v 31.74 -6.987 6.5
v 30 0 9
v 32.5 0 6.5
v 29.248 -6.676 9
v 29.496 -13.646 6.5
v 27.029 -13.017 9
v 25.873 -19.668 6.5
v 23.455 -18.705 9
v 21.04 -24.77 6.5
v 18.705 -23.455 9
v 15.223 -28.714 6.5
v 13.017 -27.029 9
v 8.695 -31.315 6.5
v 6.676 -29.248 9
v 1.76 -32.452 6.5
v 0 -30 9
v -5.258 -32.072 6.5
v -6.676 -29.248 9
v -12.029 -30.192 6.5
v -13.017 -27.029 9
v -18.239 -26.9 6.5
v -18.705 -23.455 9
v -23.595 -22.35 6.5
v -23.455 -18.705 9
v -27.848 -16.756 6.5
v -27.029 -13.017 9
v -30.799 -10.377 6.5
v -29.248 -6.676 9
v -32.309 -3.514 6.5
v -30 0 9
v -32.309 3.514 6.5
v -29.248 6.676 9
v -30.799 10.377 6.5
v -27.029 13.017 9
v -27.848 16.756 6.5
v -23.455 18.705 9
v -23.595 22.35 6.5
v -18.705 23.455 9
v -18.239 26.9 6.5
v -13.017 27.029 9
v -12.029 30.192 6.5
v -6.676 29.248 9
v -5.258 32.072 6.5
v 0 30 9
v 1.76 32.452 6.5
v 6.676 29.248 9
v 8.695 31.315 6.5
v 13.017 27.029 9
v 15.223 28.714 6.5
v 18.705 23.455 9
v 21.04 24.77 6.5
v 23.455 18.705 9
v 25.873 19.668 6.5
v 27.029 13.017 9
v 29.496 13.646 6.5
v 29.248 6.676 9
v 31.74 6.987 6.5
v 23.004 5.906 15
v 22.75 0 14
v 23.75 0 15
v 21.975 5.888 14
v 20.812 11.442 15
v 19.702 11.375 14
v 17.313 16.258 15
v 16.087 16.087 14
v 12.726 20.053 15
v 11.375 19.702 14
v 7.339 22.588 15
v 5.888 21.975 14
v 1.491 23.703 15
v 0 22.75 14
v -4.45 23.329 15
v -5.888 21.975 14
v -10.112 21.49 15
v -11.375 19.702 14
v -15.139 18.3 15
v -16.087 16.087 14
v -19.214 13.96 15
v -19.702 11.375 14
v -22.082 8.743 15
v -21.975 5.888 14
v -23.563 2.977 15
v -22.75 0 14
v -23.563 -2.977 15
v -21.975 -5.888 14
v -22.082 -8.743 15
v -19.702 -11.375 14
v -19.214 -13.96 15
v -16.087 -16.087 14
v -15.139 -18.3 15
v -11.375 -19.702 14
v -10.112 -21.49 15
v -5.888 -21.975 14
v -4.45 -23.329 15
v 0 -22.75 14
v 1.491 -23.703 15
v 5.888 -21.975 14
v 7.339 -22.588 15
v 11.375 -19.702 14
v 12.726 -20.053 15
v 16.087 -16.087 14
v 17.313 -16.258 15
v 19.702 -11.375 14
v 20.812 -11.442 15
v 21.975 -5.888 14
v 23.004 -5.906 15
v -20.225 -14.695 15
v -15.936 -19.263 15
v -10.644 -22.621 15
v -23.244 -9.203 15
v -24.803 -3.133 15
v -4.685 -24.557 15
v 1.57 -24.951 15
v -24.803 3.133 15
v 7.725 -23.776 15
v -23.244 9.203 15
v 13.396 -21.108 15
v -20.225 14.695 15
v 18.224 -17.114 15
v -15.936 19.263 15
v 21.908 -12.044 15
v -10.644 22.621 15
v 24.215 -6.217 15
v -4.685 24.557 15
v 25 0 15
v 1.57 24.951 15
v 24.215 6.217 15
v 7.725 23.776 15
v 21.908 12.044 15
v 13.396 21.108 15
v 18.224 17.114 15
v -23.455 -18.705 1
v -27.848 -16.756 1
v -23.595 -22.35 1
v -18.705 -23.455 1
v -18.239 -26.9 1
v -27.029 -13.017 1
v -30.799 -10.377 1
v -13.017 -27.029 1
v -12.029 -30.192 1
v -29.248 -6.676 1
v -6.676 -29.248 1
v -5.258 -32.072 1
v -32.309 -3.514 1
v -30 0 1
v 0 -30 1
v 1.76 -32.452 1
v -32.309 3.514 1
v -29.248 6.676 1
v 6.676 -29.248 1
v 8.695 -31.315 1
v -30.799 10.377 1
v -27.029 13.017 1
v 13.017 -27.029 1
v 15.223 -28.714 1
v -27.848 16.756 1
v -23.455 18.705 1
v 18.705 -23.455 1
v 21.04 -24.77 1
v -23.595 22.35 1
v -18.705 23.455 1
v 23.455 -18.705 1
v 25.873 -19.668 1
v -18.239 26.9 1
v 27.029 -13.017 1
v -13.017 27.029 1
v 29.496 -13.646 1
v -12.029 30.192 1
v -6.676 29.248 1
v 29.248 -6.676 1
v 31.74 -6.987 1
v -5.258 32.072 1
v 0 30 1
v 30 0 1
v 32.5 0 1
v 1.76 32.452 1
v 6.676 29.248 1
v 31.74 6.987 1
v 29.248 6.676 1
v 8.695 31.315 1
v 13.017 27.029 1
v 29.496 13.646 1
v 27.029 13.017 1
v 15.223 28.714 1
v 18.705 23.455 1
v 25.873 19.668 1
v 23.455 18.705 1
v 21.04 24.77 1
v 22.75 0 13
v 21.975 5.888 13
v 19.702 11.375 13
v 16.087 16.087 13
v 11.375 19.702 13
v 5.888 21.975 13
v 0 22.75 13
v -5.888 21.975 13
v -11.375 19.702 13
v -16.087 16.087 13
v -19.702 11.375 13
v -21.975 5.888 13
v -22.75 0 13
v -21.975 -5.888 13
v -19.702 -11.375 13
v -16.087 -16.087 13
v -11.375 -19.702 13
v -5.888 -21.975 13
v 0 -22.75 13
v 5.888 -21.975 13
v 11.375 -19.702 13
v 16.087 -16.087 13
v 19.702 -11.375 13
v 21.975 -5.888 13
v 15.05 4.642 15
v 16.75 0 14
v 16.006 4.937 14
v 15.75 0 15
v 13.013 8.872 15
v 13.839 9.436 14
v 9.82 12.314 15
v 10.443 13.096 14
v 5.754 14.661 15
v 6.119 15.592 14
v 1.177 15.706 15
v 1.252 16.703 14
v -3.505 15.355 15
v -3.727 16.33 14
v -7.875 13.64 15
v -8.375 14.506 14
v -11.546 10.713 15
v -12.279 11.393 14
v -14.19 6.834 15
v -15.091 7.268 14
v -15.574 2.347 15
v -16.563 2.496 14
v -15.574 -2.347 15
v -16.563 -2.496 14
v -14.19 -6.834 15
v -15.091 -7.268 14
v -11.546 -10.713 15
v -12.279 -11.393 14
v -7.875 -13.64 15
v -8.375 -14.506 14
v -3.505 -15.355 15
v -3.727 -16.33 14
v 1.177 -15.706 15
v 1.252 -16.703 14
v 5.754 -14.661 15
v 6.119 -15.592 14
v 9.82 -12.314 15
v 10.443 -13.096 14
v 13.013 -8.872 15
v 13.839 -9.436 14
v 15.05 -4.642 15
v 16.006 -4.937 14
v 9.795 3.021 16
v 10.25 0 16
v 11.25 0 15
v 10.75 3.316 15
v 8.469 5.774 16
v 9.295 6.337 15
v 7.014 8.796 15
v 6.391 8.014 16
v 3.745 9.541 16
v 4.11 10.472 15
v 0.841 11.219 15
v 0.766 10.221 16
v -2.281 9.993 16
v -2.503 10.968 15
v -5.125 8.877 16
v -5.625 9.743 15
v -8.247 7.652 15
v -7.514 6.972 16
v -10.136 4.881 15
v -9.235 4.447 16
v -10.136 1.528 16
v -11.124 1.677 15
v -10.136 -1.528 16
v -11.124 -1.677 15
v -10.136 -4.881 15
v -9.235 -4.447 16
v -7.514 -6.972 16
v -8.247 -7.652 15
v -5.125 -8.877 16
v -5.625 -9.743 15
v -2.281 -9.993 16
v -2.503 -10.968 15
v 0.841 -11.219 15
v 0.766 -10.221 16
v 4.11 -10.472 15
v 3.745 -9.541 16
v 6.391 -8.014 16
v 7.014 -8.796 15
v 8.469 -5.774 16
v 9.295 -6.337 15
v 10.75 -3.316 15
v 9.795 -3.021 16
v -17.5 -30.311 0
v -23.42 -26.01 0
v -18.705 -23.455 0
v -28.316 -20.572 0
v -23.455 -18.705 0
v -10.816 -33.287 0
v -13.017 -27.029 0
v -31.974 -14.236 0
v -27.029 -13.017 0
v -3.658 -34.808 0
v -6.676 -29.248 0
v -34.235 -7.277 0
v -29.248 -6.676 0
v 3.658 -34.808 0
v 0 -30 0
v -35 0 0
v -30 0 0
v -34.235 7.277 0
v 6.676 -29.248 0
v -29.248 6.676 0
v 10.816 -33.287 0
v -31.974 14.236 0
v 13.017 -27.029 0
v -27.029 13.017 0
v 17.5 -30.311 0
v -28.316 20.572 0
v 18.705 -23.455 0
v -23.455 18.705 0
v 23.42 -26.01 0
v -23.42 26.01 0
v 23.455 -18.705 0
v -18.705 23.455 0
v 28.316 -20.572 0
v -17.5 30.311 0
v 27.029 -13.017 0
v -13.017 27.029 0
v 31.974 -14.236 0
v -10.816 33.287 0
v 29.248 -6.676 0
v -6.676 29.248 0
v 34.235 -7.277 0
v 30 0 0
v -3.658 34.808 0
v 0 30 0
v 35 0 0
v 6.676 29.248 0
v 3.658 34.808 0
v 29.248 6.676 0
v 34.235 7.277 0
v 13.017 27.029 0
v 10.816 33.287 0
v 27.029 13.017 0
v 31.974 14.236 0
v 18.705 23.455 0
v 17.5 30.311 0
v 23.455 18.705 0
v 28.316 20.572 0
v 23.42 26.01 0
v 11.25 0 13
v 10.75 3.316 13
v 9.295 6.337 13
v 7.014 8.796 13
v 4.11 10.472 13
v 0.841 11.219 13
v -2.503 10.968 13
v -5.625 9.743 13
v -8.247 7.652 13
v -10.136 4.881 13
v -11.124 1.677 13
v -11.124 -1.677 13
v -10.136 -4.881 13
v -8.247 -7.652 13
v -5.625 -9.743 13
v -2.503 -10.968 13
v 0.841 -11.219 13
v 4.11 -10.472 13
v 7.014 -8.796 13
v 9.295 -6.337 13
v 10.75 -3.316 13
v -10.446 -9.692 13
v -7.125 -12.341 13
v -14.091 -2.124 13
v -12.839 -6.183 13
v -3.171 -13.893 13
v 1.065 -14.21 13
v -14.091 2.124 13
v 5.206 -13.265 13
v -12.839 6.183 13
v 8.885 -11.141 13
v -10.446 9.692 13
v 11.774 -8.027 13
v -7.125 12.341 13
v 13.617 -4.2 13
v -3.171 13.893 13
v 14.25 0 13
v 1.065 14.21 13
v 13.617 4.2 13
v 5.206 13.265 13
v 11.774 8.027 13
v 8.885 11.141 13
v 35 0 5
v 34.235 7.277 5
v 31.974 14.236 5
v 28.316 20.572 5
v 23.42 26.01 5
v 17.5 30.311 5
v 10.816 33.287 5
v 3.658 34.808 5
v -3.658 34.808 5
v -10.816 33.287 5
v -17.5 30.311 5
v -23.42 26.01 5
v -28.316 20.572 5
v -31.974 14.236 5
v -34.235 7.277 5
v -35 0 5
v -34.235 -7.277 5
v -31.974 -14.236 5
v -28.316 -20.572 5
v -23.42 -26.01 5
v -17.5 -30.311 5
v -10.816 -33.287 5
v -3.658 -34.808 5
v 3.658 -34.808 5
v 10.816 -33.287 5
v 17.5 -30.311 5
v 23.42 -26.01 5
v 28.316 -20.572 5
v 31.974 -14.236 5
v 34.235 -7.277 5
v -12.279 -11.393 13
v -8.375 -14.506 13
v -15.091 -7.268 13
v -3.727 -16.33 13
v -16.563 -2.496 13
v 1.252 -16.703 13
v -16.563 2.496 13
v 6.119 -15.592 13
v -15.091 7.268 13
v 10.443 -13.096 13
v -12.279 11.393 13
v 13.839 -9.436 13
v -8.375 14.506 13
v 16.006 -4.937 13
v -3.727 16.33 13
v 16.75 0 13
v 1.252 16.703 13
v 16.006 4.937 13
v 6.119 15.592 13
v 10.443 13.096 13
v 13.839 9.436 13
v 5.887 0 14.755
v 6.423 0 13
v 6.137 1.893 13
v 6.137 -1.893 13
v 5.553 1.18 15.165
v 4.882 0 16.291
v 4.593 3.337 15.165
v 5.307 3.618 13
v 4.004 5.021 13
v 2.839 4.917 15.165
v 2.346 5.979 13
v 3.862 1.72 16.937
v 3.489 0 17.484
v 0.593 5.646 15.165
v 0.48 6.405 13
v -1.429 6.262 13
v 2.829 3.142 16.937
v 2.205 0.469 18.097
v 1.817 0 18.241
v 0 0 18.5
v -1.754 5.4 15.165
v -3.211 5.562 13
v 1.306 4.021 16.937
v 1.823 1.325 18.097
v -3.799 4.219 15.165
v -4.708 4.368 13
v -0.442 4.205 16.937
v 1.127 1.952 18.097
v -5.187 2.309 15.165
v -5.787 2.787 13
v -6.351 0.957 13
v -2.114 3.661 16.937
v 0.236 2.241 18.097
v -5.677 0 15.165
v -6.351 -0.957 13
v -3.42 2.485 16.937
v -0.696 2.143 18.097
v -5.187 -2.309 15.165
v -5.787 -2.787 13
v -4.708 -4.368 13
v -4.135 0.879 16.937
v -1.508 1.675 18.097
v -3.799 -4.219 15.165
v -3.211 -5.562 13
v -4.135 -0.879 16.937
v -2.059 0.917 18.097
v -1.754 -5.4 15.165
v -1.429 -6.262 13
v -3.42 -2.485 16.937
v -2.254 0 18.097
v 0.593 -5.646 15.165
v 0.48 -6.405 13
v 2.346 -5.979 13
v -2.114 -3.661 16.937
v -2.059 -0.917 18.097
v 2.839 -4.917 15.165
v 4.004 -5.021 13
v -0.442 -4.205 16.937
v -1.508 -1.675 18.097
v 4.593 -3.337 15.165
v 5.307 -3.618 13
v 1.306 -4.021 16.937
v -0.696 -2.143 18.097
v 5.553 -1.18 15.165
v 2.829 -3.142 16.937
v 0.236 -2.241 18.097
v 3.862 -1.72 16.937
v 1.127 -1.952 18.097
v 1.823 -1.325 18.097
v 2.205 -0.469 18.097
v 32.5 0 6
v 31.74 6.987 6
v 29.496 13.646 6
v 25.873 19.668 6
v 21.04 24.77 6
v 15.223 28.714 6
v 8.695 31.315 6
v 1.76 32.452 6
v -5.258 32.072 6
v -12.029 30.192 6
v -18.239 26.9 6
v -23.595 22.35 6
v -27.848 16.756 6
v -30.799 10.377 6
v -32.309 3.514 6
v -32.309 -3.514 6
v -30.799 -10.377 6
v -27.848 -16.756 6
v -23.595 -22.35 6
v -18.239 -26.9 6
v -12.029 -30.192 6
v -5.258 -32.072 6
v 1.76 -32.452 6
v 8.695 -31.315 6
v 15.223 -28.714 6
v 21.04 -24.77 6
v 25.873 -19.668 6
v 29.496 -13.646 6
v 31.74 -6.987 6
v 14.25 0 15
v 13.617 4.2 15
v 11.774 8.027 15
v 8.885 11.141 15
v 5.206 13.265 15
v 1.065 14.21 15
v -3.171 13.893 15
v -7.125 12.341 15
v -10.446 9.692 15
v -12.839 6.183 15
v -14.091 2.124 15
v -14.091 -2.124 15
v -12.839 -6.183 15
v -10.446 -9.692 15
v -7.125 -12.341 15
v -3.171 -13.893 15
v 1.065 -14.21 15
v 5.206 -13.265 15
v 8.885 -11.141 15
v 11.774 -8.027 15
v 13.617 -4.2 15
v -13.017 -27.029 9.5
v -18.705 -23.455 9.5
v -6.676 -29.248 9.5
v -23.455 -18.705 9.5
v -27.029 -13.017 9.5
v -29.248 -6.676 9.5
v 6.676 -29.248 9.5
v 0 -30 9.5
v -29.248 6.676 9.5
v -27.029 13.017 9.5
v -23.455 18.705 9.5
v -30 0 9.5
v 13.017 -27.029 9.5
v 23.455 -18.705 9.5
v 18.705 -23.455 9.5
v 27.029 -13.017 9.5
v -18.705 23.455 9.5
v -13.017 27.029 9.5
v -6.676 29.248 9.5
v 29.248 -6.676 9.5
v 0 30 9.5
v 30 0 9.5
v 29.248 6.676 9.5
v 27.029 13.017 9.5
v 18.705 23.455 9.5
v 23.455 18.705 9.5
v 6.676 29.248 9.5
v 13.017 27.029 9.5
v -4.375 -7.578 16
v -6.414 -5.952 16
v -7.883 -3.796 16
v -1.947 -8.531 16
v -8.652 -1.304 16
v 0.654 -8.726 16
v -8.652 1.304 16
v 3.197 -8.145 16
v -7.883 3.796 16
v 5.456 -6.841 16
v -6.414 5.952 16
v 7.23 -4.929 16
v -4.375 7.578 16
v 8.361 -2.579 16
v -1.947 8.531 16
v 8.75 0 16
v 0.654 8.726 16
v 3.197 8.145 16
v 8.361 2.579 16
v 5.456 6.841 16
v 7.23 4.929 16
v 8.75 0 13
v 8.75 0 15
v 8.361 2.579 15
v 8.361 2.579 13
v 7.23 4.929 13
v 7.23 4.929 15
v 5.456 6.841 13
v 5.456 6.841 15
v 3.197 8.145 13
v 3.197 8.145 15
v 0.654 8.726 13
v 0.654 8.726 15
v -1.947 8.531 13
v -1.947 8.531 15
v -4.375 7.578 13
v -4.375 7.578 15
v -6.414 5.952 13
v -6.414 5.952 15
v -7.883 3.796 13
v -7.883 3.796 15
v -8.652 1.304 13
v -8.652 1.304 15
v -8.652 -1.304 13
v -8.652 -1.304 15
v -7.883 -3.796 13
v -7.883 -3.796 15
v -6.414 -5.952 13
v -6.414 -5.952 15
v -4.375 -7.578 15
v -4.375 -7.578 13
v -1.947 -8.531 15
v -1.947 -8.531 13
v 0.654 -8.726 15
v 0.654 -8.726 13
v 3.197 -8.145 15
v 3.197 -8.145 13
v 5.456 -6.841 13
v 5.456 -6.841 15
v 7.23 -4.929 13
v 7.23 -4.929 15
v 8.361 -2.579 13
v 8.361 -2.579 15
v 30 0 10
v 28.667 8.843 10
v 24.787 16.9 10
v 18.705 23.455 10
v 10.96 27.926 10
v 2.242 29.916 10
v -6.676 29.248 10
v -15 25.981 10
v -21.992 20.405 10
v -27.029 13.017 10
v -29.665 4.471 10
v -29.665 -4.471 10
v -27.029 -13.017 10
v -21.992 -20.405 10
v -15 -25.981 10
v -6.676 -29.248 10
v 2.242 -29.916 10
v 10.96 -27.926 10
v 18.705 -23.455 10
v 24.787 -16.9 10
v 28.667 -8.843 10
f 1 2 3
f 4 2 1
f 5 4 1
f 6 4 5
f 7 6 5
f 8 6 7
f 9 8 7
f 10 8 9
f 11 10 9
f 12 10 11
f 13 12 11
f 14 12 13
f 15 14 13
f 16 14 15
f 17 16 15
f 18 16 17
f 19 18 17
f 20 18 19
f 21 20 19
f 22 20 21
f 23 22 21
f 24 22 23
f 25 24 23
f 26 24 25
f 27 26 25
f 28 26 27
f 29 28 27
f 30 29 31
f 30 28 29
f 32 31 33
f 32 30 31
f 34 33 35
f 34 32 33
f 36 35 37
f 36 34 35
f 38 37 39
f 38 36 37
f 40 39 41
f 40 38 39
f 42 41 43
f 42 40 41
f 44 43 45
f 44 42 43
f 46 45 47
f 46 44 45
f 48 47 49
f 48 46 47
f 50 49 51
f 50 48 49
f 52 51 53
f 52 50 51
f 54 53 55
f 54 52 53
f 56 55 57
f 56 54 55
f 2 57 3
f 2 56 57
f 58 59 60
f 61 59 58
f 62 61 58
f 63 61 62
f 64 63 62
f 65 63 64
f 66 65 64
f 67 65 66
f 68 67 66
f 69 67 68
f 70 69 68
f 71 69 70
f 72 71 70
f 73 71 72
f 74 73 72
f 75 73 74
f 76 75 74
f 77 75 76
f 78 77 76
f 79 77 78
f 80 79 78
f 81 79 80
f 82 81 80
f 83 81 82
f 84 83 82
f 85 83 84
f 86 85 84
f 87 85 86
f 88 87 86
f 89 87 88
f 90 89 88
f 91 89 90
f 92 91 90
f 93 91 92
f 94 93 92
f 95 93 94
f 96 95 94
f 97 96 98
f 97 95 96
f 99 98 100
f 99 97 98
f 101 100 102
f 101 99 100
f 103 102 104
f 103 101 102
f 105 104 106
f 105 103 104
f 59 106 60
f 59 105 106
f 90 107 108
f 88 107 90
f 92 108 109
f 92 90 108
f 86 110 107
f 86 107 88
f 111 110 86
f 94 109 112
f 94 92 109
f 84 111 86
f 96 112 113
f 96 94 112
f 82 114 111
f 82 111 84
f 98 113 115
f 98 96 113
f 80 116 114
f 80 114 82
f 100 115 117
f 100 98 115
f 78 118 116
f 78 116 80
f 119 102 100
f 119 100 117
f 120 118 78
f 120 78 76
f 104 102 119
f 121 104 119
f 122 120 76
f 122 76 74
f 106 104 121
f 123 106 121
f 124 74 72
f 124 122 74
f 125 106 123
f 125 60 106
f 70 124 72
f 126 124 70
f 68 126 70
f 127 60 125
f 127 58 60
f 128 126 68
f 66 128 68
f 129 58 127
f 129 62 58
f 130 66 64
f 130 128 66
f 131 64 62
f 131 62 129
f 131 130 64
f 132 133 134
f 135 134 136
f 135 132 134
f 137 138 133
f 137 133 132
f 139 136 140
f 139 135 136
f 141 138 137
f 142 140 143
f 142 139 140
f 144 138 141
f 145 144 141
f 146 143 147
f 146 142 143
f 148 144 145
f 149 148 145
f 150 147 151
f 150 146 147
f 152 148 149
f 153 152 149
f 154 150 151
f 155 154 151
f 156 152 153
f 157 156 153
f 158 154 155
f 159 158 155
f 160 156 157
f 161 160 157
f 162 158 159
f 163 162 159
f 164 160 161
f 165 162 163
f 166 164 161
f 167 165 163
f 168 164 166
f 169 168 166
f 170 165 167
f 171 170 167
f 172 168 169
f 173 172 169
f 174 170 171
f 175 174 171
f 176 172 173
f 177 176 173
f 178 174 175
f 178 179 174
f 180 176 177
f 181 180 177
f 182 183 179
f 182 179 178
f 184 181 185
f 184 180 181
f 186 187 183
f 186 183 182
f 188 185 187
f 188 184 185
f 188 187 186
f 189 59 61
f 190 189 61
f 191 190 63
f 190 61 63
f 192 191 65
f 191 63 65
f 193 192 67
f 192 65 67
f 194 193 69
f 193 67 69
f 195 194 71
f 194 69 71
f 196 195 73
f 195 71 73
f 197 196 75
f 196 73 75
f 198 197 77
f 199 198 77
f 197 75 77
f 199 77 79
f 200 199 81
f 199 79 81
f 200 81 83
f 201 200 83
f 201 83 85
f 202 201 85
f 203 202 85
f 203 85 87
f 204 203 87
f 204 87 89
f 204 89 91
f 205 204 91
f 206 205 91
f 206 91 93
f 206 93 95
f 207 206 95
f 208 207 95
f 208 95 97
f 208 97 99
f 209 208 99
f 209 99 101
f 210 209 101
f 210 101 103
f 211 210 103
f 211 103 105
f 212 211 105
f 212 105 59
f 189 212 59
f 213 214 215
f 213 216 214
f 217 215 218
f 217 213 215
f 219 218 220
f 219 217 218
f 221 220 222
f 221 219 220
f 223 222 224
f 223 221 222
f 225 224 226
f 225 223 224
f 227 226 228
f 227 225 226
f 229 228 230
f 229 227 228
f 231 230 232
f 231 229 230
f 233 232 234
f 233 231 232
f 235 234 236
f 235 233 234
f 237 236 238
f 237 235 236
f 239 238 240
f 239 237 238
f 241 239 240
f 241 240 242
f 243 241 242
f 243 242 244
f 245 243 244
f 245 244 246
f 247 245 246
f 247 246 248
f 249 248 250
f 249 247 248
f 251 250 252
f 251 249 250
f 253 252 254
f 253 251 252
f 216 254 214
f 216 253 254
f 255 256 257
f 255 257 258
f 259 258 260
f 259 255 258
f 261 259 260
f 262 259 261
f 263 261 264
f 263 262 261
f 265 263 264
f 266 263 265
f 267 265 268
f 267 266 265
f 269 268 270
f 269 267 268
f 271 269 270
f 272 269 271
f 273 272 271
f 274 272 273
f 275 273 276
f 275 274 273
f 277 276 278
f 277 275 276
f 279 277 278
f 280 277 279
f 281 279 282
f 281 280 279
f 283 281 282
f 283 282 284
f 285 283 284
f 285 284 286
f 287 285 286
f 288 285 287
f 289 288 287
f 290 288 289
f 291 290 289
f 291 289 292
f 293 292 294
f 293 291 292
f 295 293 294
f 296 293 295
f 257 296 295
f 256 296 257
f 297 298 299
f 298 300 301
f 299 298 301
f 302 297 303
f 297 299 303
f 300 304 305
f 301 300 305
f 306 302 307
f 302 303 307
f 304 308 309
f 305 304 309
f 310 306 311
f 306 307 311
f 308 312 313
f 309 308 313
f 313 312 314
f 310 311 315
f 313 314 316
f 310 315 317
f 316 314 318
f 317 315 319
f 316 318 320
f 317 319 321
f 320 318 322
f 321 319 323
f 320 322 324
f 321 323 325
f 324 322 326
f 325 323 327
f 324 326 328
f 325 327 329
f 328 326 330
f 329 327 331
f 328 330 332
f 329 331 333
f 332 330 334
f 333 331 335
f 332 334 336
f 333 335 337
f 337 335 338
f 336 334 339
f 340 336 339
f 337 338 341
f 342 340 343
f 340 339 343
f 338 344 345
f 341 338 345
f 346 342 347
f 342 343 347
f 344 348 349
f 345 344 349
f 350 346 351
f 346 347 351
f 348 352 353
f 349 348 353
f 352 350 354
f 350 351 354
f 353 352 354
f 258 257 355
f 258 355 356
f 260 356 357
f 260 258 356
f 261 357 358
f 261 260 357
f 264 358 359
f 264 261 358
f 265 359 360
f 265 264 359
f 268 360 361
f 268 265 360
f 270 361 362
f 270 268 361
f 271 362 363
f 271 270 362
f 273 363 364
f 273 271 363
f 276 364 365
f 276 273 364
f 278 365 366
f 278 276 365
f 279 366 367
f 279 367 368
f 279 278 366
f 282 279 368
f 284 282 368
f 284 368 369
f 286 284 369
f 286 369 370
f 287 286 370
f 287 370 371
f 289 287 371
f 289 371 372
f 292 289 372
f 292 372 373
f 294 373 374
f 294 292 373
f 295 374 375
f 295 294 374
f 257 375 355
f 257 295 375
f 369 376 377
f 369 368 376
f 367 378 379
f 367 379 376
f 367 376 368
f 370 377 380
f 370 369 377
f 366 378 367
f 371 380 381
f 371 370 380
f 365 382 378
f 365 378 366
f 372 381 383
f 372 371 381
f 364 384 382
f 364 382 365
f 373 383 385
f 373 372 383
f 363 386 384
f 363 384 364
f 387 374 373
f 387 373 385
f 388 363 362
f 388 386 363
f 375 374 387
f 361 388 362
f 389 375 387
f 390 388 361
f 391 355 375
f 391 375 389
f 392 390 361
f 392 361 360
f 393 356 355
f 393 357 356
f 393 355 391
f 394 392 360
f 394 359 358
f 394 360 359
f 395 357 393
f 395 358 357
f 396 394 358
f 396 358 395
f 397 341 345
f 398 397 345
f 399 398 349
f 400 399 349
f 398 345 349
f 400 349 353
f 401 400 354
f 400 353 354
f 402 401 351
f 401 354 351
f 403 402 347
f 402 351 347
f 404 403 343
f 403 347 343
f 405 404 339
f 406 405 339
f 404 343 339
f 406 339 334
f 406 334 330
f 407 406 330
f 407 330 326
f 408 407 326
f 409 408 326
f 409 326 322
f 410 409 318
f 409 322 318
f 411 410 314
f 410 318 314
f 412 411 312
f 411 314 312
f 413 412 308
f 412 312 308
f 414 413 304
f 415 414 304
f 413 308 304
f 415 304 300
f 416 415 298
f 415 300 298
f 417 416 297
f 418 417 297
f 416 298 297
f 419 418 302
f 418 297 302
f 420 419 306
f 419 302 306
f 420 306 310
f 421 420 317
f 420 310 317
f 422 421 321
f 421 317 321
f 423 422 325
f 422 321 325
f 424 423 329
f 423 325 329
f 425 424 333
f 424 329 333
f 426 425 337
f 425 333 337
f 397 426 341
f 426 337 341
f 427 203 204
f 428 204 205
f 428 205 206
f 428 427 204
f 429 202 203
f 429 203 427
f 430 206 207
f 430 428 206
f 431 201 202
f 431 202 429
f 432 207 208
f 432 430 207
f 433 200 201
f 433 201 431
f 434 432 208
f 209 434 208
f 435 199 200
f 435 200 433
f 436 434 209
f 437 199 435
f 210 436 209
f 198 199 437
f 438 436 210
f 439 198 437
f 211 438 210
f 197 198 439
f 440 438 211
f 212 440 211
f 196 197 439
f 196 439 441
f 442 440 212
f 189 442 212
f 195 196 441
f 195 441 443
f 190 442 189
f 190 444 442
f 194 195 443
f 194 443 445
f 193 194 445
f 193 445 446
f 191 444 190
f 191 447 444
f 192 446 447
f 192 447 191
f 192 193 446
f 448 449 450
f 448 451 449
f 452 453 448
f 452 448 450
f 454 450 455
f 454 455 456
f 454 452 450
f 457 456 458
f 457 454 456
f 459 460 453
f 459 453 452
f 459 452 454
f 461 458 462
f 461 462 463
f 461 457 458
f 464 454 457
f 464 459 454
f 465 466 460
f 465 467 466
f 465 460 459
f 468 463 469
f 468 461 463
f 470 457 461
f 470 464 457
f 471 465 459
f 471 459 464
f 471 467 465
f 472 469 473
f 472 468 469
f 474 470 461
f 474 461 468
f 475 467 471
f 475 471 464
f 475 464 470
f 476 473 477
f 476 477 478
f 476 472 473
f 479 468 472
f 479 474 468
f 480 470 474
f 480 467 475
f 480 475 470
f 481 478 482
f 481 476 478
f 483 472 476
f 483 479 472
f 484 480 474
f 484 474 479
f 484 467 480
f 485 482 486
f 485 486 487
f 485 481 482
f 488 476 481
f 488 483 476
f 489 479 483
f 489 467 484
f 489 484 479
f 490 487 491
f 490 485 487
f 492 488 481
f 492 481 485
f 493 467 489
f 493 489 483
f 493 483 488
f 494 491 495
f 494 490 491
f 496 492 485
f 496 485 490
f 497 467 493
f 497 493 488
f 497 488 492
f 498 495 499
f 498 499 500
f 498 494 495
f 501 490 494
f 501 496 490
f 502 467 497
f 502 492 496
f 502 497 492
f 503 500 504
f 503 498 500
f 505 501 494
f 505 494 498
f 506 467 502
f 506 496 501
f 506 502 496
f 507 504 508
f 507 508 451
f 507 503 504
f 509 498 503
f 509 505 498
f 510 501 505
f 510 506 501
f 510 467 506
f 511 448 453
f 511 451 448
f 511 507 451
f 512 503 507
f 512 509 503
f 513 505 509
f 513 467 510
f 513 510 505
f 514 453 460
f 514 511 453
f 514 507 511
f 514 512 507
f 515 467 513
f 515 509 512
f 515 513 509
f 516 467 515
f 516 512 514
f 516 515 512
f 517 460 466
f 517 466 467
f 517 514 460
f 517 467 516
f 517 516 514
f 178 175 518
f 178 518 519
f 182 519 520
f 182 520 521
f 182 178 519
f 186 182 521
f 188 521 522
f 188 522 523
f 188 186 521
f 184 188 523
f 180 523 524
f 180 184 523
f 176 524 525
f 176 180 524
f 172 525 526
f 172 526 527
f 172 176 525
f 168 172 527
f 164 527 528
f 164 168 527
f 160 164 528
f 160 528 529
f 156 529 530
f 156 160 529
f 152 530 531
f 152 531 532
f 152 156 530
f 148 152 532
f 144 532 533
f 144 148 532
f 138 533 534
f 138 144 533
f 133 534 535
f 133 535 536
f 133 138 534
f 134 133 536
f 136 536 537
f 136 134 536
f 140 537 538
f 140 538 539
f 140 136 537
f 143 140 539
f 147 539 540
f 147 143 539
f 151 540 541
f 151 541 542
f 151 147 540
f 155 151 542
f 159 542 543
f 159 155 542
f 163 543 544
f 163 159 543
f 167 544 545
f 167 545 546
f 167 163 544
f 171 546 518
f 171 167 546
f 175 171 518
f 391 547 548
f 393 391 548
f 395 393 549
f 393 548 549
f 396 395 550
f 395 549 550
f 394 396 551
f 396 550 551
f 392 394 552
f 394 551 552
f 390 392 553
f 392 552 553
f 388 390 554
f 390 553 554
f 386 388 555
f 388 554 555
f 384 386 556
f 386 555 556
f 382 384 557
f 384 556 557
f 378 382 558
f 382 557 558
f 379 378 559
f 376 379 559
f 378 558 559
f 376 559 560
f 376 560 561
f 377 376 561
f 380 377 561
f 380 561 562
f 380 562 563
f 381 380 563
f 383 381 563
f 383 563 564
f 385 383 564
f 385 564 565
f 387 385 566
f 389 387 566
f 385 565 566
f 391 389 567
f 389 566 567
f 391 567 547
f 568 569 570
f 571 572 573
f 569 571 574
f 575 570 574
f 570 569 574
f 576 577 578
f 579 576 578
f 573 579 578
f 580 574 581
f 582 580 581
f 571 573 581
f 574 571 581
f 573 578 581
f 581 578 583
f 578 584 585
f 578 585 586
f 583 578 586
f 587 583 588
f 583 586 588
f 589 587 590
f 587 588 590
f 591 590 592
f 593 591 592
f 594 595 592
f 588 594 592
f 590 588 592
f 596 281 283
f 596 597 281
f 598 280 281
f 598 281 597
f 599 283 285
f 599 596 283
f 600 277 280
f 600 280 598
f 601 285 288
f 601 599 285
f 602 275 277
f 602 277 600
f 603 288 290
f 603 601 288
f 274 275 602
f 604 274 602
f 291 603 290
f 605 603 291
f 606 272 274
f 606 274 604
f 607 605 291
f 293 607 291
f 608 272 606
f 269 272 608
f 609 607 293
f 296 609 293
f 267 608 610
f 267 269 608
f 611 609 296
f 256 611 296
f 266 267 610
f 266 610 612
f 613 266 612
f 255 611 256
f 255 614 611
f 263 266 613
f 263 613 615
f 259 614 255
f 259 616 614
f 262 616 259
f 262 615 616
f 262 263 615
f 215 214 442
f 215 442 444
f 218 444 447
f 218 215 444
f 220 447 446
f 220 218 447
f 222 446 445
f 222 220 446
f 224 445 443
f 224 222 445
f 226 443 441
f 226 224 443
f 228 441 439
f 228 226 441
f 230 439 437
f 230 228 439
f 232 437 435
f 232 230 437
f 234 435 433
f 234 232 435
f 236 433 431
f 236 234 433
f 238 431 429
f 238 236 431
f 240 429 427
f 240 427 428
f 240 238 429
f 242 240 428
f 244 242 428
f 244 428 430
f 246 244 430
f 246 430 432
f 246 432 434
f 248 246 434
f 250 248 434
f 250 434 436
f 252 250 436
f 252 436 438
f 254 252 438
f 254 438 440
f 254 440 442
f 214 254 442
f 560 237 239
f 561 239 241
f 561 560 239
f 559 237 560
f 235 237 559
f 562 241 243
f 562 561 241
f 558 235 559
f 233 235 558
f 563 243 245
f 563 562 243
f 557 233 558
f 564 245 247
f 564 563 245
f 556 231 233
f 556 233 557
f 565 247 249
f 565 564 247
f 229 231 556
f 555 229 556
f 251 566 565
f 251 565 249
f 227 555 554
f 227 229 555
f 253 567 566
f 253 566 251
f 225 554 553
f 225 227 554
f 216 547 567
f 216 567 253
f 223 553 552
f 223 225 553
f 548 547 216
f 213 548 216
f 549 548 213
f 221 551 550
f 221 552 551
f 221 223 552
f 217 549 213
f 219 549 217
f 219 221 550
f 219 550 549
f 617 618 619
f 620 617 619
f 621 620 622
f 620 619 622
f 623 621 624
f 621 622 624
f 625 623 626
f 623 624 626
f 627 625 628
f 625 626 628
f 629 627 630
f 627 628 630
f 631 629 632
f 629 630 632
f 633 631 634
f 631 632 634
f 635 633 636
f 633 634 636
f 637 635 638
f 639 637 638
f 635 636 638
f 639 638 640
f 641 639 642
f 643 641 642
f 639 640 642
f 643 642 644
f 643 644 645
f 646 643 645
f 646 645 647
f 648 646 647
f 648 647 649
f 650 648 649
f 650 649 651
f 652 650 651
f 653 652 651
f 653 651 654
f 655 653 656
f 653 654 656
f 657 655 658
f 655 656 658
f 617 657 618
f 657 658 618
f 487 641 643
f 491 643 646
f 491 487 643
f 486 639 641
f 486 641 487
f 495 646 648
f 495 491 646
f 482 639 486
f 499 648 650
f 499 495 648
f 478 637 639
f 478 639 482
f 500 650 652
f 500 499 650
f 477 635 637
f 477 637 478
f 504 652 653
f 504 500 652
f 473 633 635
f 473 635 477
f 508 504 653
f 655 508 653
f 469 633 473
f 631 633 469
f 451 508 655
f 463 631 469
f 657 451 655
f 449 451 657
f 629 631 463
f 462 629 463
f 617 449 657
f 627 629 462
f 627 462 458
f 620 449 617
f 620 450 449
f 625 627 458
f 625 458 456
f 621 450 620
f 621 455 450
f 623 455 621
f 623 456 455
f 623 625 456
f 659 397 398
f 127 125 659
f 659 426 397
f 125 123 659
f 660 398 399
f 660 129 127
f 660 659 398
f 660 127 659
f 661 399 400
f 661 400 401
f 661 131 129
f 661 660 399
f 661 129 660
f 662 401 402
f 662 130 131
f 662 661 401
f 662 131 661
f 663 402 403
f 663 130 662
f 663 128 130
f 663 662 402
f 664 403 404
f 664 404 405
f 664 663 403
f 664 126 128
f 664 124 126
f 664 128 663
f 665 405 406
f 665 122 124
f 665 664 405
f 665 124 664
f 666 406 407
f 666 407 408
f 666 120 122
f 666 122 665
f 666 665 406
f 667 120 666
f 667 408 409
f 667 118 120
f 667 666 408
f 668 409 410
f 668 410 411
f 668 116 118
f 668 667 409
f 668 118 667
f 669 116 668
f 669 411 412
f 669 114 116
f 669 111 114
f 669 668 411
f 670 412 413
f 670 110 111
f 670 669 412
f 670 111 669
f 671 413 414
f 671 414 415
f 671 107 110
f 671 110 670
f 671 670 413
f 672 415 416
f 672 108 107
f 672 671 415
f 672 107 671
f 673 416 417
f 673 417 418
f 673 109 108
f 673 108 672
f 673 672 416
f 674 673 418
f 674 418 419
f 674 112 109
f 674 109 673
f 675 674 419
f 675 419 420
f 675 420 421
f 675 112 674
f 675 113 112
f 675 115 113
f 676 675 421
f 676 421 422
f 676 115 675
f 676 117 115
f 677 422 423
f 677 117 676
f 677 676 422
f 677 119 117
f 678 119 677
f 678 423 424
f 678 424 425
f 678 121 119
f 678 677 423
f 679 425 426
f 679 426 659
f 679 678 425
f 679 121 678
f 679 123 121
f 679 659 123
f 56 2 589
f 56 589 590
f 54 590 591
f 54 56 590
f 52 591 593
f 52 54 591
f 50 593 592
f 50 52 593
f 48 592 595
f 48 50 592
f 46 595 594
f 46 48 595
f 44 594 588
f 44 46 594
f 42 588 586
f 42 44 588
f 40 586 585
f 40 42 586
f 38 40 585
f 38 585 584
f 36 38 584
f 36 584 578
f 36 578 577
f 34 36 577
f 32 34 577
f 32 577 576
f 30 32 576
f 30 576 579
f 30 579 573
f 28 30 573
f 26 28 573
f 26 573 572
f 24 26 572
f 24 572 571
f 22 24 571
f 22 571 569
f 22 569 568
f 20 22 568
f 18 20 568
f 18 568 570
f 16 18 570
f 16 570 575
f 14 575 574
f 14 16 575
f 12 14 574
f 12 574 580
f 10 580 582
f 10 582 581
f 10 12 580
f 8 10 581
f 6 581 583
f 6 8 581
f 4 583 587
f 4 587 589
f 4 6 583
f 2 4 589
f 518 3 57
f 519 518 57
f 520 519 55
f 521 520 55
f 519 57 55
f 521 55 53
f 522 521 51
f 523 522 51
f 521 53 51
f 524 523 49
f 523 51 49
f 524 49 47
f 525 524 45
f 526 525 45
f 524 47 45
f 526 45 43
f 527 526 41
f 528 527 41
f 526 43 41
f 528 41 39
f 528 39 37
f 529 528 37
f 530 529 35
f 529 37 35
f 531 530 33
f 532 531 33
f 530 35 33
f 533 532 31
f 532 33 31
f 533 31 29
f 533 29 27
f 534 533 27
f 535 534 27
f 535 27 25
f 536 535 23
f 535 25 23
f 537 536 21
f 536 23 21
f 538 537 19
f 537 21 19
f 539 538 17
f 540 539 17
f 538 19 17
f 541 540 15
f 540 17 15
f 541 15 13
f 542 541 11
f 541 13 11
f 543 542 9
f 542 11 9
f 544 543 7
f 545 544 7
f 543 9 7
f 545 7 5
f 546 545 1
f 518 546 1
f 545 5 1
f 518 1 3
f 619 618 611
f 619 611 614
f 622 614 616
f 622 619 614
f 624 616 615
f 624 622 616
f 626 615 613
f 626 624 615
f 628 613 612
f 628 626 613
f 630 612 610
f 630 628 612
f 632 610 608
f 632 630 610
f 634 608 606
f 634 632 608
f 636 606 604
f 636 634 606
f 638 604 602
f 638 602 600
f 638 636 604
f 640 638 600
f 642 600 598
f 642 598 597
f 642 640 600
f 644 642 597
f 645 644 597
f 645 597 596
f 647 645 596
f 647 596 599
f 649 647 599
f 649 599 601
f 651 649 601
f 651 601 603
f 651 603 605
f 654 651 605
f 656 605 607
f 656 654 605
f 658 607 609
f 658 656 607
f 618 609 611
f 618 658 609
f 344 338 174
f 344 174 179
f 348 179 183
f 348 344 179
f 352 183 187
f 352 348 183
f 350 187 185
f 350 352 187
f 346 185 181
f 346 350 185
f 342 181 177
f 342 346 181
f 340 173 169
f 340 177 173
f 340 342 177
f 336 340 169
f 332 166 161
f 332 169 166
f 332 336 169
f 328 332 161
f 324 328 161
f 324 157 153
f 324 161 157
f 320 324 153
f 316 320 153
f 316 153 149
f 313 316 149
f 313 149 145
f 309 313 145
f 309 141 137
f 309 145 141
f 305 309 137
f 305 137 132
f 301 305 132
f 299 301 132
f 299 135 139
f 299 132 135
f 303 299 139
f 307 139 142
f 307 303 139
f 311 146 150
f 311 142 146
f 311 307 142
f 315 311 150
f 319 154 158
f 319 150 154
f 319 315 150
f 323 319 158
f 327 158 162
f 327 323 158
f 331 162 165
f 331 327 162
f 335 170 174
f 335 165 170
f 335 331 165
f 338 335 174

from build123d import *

# Parameters (mm, degrees)
F0_R         = 35
F1_DEPTH     = 15
F2_SIZE      = 10
F4_R         = 22.75
F4_R_2       = 16.75
F5_DEPTH     = 2
F4_R_3       = 14.25
F4_R_4       = 11.25
F6_DEPTH     = 2
F4_R_5       = 8.75
F7_DEPTH     = 2
F8_DEPTH     = 1
F12_R        = 30
F13_DEPTH    = 9.5
F15_R        = 32.5
F16_DEPTH    = 5
F17_S5_R     = 32.5
F17_T6_DEPTH = 48


# Not quite as in the source:
# - a fillet or chamfer that OpenCascade refuses, or shapes differently, is made with other operations: its cross-section is extruded or revolved along the edge and cut away or added


with BuildPart() as f1:
    # F0 (on Top) → F1 (new body)
    with BuildSketch(Plane.XY):
        Circle(F0_R)
    extrude(amount=F1_DEPTH)

    # F2
    f2_edges = [f1.edges().sort_by_distance(p)[0] for p in [
        (-35, 0, 15),
    ]]
    chamfer(f2_edges, length=F2_SIZE)

    # F4 (on offset) → F5 (cut)
    with BuildSketch(Plane.XY.offset(15)):
        Circle(F4_R)
        Circle(F4_R_2, mode=Mode.SUBTRACT)
    extrude(amount=-F5_DEPTH, mode=Mode.SUBTRACT)

    # F4 (on offset) → F6 (cut)
    with BuildSketch(Plane.XY.offset(15)):
        Circle(F4_R_3)
        Circle(F4_R_4, mode=Mode.SUBTRACT)
    extrude(amount=-F6_DEPTH, mode=Mode.SUBTRACT)

    # F4 (on offset) → F7 (cut)
    with BuildSketch(Plane.XY.offset(15)):
        Circle(F4_R_5)
    extrude(amount=-F7_DEPTH, mode=Mode.SUBTRACT)

    # F4 (on offset) → F8 (join)
    with BuildSketch(Plane.XY.offset(15)):
        Circle(F4_R_4)
        Circle(F4_R_5, mode=Mode.SUBTRACT)
    extrude(amount=F8_DEPTH)

    # F9 (on Front) → F10 (revolve)
    with BuildSketch(Plane.XZ):
        with BuildLine():
            Line((0, 12), (0, 5.5))
            ThreePointArc((0, 5.5), (4.5961940777, 7.4038059223), (6.5, 12))
            Line((6.5, 12), (0, 12))
        make_face()
        with BuildLine():
            Line((0, 18.5), (0, 12))
            Line((0, 12), (6.5, 12))
            ThreePointArc((6.5, 12), (4.5961940777, 16.5961940777), (0, 18.5))
        make_face()
    revolve(axis=Axis((0, 0, 6), (0, 0, 1)))

    # F11: chamfer of 1 on 3 edges, made by hand

    # F11_s1 → F11_t2 (revolve, cut)
    with BuildSketch(Plane.XZ):
        Polygon((23.75, 15), (22.75, 14), (22.75, 15), align=None)
    revolve(axis=Axis((0, 0, 15), (0, 0, 1)), mode=Mode.SUBTRACT)

    # F11_s3 → F11_t4 (revolve, cut)
    with BuildSketch(Plane.XZ):
        Polygon((16.75, 14), (15.75, 15), (16.75, 15), align=None)
    revolve(axis=Axis((0, 0, 15), (0, 0, 1)), mode=Mode.SUBTRACT)

    # F11_s5 → F11_t6 (revolve, cut)
    with BuildSketch(Plane.XZ):
        Polygon((11.25, 15), (10.25, 16), (11.25, 16), align=None)
    revolve(axis=Axis((0, 0, 16), (0, 0, 1)), mode=Mode.SUBTRACT)

    # F12 (on Top) → F13 (cut)
    with BuildSketch(Plane.XY):
        Circle(F12_R)
    extrude(amount=F13_DEPTH, mode=Mode.SUBTRACT)

    # F15 (on offset) → F16 (cut)
    with BuildSketch(Plane.XY.offset(1)):
        Circle(F15_R)
    extrude(amount=F16_DEPTH, mode=Mode.SUBTRACT)

    # F17: chamfer of 3 on 1 edges, made by hand


with BuildPart() as f17_tool2:
    # F17_s3 → F17_t4 (revolve)
    with BuildSketch(Plane.XZ):
        Polygon((33, 6), (30, 9), (30, 6), align=None)
    revolve(axis=Axis((0, 0, 6), (0, 0, -1)))

    # F17_s5 → F17_t6 (intersect, symmetric)
    with BuildSketch(Plane.XY.offset(7.5)):
        Circle(F17_S5_R)
    extrude(amount=F17_T6_DEPTH, both=True, mode=Mode.INTERSECT)


with BuildPart() as f1_1:
    add(f1.part)

    # F17_t1: cut F17_tool2
    add(f17_tool2.part, mode=Mode.SUBTRACT)


solid = f1_1.part
